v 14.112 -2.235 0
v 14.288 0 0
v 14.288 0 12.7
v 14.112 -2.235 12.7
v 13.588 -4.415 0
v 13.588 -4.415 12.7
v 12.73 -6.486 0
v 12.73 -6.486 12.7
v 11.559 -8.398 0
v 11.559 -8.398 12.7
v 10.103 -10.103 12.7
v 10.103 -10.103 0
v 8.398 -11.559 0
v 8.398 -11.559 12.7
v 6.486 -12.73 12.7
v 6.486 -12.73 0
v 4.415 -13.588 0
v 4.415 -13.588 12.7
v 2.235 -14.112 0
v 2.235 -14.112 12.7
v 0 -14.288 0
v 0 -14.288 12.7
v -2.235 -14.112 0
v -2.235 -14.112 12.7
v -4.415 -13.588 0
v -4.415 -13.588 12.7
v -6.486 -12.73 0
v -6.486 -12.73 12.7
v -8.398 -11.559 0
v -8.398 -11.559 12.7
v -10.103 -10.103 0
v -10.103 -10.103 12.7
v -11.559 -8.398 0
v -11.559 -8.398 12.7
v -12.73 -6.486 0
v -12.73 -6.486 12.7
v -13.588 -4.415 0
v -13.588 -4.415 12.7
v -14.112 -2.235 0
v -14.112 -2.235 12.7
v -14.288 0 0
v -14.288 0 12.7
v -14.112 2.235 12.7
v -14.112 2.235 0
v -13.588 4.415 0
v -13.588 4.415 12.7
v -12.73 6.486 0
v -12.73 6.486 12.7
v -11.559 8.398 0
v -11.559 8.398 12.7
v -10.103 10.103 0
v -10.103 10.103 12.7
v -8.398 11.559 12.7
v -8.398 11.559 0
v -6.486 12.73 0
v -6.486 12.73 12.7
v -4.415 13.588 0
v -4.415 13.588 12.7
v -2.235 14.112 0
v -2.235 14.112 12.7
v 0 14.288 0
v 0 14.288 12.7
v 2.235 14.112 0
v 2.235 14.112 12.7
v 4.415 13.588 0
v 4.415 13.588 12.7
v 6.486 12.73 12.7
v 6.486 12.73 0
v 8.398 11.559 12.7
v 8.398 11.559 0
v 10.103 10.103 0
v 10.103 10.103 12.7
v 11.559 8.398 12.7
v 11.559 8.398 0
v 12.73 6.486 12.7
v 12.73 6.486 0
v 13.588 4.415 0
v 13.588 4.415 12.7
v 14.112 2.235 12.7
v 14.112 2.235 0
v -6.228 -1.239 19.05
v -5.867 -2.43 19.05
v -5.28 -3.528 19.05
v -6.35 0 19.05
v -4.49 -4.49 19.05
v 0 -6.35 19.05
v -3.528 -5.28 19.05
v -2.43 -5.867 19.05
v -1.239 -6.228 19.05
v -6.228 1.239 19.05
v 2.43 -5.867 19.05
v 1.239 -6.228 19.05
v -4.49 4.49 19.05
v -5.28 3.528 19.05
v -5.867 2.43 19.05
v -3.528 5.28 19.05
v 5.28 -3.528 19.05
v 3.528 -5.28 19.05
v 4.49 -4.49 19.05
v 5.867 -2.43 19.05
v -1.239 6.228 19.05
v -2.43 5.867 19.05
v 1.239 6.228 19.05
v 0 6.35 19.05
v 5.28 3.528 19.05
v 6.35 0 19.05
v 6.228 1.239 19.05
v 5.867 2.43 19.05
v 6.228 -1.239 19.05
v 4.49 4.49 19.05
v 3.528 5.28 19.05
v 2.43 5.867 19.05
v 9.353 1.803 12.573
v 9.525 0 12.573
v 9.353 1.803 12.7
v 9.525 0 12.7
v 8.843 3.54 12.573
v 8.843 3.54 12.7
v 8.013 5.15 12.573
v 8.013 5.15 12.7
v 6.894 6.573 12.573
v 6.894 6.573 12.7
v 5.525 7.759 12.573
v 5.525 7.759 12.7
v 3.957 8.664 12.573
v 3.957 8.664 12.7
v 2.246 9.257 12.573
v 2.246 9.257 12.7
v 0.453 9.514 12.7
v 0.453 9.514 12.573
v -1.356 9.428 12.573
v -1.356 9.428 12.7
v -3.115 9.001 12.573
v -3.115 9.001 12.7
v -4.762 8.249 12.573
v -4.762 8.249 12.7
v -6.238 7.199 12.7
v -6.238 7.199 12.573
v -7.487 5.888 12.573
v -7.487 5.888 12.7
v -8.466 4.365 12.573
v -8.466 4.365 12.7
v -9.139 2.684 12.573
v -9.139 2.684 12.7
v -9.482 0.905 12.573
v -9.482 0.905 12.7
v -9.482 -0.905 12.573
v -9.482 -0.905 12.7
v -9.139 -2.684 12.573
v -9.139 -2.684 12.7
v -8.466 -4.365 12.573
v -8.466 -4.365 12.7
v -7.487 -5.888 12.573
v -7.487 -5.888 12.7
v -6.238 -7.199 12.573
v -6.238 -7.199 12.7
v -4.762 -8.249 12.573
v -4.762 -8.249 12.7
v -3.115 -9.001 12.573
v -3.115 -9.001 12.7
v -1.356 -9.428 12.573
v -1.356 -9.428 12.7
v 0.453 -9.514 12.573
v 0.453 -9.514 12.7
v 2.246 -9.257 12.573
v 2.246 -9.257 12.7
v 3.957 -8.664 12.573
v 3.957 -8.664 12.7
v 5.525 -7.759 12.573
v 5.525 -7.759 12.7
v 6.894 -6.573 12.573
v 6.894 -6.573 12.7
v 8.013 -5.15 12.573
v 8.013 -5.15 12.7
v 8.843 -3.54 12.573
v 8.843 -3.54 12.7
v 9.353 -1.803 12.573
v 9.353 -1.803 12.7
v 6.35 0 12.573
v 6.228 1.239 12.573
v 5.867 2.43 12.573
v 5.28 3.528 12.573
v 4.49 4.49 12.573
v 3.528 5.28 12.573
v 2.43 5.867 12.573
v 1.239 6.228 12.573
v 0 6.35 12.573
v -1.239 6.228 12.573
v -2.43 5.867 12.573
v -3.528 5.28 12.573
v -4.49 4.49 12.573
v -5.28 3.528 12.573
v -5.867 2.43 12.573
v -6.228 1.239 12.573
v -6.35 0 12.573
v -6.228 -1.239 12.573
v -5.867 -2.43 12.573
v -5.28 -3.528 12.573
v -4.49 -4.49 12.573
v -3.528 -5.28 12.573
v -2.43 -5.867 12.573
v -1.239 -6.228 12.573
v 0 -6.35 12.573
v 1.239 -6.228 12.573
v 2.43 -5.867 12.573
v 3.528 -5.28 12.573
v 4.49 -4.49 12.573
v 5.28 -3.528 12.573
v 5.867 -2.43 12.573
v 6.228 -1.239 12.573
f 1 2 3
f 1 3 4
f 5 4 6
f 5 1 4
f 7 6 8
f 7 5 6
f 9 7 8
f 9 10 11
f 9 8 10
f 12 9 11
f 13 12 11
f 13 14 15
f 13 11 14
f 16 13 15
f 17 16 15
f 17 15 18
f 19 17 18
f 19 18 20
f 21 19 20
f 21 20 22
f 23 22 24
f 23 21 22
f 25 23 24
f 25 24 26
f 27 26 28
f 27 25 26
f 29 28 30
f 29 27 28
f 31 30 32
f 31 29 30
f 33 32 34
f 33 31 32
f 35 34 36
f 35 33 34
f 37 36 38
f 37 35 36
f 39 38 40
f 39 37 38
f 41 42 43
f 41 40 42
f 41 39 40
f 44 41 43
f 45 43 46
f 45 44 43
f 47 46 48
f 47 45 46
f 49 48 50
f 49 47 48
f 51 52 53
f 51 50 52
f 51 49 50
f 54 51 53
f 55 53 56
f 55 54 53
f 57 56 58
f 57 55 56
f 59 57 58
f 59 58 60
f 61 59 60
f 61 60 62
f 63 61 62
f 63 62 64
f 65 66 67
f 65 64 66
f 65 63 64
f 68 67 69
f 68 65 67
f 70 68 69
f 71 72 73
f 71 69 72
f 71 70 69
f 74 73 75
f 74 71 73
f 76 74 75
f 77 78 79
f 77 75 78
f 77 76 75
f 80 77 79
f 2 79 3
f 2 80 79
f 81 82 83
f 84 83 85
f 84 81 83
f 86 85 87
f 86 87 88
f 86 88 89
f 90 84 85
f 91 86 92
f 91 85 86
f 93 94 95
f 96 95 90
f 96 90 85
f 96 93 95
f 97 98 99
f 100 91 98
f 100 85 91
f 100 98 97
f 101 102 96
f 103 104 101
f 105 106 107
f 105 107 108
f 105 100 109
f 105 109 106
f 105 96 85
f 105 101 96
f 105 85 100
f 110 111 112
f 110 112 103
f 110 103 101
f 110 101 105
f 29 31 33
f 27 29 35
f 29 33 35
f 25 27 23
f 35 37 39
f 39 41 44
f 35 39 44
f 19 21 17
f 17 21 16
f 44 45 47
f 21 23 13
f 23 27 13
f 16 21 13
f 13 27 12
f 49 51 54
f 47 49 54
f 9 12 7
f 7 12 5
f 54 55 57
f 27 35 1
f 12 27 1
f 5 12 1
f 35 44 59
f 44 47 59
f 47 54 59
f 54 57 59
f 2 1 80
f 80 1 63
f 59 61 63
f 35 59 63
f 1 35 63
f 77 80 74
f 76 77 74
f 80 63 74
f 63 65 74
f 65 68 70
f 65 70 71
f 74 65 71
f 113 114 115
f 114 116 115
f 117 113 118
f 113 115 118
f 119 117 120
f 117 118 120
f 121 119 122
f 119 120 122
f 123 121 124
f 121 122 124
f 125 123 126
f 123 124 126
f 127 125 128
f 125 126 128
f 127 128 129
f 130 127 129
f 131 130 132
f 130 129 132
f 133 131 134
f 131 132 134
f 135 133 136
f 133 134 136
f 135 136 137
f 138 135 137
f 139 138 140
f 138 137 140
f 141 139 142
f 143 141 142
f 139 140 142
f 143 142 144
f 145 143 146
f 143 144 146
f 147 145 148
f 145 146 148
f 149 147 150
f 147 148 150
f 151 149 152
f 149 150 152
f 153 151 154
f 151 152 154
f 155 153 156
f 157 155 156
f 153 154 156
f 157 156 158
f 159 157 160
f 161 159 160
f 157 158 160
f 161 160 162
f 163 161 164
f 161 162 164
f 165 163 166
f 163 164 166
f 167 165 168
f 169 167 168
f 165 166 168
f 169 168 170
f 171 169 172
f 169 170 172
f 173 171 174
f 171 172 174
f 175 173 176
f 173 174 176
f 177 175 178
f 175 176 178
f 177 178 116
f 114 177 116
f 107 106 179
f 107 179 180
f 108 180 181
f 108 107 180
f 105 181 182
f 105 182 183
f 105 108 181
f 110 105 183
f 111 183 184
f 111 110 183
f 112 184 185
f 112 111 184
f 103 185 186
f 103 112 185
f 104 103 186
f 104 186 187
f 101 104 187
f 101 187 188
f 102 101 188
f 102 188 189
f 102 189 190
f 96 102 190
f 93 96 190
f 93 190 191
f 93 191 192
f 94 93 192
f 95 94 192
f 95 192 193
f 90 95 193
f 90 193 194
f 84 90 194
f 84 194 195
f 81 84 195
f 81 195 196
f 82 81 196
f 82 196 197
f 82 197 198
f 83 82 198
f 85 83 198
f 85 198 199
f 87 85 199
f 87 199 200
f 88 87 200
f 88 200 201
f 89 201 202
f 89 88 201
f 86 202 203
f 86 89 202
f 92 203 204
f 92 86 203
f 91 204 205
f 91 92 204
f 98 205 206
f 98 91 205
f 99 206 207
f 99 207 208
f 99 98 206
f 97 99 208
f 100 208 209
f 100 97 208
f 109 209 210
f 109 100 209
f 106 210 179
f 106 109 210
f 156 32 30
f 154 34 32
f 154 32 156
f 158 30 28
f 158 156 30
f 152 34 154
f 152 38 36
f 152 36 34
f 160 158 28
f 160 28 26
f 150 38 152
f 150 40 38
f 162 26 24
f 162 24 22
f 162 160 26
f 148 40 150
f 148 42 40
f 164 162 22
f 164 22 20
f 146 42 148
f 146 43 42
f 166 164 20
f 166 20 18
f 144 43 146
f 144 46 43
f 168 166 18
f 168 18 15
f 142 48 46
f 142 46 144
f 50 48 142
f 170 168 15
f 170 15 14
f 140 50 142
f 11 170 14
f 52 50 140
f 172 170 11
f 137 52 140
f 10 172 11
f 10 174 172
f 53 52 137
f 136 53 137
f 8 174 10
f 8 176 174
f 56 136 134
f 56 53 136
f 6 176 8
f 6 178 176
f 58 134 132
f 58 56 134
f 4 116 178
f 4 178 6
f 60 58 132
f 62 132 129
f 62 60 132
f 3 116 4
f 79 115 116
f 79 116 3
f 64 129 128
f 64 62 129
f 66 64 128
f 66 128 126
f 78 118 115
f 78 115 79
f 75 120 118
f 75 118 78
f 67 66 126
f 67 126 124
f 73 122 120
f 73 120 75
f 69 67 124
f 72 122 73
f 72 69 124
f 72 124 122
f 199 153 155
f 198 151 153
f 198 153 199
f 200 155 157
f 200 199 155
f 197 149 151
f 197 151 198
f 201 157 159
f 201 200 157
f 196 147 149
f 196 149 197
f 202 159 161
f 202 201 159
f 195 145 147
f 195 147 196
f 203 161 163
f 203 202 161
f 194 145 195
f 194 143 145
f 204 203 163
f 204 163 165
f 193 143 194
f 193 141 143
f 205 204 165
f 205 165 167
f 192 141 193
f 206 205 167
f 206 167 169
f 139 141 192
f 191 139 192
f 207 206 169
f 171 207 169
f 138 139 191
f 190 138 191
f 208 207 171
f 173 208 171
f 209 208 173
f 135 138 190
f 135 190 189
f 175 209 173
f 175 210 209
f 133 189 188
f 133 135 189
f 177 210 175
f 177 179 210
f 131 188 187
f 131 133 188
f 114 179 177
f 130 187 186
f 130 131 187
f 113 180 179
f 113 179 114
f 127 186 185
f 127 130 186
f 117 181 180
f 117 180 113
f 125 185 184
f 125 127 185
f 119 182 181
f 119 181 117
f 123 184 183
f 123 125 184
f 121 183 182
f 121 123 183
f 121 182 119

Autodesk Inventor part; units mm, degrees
ref_plane "YZ Plane" through (0, 0, 0) normal (1, 0, 0) x (0, 1, 0)
ref_plane "XZ Plane" through (0, 0, 0) normal (0, 1, 0) x (-1, 0, 0)
ref_plane "XY Plane" through (0, 0, 0) normal (0, 0, 1) x (1, 0, 0)
sketch "Sketch1" plane through (0, 0, 0) normal (0, 0, 1) x (1, 0, 0)
  circle A0 centre (0, 0) radius 14.2875
  dimension "d0" = 28.575
extrude "Extrusion1" add sketch "Sketch1" along normal blind 12.7
sketch "Sketch2" plane through (0, 0, 12.7) normal (0, 0, 1) x (1, 0, 0)
  circle A0 centre (0, 0) radius 14.2875 projected
  circle A1 centre (0, 0) radius 6.35
  dimension "d4" = 12.7
extrude "Extrusion2" add sketch "Sketch2" along normal blind 6.35 contours A1
sketch "Sketch3" plane through (0, 0, 12.7) normal (0, 0, 1) x (1, 0, 0)
  circle A0 centre (0, 0) radius 6.35 projected
  circle A1 centre (0, 0) radius 14.2875 projected
  circle A2 centre (0, 0) radius 9.525
  dimension "d7" = 19.05
extrude "Extrusion3" cut sketch "Sketch3" against normal blind 0.127 contours A2
properties part number ".6250  Bearing Press"
